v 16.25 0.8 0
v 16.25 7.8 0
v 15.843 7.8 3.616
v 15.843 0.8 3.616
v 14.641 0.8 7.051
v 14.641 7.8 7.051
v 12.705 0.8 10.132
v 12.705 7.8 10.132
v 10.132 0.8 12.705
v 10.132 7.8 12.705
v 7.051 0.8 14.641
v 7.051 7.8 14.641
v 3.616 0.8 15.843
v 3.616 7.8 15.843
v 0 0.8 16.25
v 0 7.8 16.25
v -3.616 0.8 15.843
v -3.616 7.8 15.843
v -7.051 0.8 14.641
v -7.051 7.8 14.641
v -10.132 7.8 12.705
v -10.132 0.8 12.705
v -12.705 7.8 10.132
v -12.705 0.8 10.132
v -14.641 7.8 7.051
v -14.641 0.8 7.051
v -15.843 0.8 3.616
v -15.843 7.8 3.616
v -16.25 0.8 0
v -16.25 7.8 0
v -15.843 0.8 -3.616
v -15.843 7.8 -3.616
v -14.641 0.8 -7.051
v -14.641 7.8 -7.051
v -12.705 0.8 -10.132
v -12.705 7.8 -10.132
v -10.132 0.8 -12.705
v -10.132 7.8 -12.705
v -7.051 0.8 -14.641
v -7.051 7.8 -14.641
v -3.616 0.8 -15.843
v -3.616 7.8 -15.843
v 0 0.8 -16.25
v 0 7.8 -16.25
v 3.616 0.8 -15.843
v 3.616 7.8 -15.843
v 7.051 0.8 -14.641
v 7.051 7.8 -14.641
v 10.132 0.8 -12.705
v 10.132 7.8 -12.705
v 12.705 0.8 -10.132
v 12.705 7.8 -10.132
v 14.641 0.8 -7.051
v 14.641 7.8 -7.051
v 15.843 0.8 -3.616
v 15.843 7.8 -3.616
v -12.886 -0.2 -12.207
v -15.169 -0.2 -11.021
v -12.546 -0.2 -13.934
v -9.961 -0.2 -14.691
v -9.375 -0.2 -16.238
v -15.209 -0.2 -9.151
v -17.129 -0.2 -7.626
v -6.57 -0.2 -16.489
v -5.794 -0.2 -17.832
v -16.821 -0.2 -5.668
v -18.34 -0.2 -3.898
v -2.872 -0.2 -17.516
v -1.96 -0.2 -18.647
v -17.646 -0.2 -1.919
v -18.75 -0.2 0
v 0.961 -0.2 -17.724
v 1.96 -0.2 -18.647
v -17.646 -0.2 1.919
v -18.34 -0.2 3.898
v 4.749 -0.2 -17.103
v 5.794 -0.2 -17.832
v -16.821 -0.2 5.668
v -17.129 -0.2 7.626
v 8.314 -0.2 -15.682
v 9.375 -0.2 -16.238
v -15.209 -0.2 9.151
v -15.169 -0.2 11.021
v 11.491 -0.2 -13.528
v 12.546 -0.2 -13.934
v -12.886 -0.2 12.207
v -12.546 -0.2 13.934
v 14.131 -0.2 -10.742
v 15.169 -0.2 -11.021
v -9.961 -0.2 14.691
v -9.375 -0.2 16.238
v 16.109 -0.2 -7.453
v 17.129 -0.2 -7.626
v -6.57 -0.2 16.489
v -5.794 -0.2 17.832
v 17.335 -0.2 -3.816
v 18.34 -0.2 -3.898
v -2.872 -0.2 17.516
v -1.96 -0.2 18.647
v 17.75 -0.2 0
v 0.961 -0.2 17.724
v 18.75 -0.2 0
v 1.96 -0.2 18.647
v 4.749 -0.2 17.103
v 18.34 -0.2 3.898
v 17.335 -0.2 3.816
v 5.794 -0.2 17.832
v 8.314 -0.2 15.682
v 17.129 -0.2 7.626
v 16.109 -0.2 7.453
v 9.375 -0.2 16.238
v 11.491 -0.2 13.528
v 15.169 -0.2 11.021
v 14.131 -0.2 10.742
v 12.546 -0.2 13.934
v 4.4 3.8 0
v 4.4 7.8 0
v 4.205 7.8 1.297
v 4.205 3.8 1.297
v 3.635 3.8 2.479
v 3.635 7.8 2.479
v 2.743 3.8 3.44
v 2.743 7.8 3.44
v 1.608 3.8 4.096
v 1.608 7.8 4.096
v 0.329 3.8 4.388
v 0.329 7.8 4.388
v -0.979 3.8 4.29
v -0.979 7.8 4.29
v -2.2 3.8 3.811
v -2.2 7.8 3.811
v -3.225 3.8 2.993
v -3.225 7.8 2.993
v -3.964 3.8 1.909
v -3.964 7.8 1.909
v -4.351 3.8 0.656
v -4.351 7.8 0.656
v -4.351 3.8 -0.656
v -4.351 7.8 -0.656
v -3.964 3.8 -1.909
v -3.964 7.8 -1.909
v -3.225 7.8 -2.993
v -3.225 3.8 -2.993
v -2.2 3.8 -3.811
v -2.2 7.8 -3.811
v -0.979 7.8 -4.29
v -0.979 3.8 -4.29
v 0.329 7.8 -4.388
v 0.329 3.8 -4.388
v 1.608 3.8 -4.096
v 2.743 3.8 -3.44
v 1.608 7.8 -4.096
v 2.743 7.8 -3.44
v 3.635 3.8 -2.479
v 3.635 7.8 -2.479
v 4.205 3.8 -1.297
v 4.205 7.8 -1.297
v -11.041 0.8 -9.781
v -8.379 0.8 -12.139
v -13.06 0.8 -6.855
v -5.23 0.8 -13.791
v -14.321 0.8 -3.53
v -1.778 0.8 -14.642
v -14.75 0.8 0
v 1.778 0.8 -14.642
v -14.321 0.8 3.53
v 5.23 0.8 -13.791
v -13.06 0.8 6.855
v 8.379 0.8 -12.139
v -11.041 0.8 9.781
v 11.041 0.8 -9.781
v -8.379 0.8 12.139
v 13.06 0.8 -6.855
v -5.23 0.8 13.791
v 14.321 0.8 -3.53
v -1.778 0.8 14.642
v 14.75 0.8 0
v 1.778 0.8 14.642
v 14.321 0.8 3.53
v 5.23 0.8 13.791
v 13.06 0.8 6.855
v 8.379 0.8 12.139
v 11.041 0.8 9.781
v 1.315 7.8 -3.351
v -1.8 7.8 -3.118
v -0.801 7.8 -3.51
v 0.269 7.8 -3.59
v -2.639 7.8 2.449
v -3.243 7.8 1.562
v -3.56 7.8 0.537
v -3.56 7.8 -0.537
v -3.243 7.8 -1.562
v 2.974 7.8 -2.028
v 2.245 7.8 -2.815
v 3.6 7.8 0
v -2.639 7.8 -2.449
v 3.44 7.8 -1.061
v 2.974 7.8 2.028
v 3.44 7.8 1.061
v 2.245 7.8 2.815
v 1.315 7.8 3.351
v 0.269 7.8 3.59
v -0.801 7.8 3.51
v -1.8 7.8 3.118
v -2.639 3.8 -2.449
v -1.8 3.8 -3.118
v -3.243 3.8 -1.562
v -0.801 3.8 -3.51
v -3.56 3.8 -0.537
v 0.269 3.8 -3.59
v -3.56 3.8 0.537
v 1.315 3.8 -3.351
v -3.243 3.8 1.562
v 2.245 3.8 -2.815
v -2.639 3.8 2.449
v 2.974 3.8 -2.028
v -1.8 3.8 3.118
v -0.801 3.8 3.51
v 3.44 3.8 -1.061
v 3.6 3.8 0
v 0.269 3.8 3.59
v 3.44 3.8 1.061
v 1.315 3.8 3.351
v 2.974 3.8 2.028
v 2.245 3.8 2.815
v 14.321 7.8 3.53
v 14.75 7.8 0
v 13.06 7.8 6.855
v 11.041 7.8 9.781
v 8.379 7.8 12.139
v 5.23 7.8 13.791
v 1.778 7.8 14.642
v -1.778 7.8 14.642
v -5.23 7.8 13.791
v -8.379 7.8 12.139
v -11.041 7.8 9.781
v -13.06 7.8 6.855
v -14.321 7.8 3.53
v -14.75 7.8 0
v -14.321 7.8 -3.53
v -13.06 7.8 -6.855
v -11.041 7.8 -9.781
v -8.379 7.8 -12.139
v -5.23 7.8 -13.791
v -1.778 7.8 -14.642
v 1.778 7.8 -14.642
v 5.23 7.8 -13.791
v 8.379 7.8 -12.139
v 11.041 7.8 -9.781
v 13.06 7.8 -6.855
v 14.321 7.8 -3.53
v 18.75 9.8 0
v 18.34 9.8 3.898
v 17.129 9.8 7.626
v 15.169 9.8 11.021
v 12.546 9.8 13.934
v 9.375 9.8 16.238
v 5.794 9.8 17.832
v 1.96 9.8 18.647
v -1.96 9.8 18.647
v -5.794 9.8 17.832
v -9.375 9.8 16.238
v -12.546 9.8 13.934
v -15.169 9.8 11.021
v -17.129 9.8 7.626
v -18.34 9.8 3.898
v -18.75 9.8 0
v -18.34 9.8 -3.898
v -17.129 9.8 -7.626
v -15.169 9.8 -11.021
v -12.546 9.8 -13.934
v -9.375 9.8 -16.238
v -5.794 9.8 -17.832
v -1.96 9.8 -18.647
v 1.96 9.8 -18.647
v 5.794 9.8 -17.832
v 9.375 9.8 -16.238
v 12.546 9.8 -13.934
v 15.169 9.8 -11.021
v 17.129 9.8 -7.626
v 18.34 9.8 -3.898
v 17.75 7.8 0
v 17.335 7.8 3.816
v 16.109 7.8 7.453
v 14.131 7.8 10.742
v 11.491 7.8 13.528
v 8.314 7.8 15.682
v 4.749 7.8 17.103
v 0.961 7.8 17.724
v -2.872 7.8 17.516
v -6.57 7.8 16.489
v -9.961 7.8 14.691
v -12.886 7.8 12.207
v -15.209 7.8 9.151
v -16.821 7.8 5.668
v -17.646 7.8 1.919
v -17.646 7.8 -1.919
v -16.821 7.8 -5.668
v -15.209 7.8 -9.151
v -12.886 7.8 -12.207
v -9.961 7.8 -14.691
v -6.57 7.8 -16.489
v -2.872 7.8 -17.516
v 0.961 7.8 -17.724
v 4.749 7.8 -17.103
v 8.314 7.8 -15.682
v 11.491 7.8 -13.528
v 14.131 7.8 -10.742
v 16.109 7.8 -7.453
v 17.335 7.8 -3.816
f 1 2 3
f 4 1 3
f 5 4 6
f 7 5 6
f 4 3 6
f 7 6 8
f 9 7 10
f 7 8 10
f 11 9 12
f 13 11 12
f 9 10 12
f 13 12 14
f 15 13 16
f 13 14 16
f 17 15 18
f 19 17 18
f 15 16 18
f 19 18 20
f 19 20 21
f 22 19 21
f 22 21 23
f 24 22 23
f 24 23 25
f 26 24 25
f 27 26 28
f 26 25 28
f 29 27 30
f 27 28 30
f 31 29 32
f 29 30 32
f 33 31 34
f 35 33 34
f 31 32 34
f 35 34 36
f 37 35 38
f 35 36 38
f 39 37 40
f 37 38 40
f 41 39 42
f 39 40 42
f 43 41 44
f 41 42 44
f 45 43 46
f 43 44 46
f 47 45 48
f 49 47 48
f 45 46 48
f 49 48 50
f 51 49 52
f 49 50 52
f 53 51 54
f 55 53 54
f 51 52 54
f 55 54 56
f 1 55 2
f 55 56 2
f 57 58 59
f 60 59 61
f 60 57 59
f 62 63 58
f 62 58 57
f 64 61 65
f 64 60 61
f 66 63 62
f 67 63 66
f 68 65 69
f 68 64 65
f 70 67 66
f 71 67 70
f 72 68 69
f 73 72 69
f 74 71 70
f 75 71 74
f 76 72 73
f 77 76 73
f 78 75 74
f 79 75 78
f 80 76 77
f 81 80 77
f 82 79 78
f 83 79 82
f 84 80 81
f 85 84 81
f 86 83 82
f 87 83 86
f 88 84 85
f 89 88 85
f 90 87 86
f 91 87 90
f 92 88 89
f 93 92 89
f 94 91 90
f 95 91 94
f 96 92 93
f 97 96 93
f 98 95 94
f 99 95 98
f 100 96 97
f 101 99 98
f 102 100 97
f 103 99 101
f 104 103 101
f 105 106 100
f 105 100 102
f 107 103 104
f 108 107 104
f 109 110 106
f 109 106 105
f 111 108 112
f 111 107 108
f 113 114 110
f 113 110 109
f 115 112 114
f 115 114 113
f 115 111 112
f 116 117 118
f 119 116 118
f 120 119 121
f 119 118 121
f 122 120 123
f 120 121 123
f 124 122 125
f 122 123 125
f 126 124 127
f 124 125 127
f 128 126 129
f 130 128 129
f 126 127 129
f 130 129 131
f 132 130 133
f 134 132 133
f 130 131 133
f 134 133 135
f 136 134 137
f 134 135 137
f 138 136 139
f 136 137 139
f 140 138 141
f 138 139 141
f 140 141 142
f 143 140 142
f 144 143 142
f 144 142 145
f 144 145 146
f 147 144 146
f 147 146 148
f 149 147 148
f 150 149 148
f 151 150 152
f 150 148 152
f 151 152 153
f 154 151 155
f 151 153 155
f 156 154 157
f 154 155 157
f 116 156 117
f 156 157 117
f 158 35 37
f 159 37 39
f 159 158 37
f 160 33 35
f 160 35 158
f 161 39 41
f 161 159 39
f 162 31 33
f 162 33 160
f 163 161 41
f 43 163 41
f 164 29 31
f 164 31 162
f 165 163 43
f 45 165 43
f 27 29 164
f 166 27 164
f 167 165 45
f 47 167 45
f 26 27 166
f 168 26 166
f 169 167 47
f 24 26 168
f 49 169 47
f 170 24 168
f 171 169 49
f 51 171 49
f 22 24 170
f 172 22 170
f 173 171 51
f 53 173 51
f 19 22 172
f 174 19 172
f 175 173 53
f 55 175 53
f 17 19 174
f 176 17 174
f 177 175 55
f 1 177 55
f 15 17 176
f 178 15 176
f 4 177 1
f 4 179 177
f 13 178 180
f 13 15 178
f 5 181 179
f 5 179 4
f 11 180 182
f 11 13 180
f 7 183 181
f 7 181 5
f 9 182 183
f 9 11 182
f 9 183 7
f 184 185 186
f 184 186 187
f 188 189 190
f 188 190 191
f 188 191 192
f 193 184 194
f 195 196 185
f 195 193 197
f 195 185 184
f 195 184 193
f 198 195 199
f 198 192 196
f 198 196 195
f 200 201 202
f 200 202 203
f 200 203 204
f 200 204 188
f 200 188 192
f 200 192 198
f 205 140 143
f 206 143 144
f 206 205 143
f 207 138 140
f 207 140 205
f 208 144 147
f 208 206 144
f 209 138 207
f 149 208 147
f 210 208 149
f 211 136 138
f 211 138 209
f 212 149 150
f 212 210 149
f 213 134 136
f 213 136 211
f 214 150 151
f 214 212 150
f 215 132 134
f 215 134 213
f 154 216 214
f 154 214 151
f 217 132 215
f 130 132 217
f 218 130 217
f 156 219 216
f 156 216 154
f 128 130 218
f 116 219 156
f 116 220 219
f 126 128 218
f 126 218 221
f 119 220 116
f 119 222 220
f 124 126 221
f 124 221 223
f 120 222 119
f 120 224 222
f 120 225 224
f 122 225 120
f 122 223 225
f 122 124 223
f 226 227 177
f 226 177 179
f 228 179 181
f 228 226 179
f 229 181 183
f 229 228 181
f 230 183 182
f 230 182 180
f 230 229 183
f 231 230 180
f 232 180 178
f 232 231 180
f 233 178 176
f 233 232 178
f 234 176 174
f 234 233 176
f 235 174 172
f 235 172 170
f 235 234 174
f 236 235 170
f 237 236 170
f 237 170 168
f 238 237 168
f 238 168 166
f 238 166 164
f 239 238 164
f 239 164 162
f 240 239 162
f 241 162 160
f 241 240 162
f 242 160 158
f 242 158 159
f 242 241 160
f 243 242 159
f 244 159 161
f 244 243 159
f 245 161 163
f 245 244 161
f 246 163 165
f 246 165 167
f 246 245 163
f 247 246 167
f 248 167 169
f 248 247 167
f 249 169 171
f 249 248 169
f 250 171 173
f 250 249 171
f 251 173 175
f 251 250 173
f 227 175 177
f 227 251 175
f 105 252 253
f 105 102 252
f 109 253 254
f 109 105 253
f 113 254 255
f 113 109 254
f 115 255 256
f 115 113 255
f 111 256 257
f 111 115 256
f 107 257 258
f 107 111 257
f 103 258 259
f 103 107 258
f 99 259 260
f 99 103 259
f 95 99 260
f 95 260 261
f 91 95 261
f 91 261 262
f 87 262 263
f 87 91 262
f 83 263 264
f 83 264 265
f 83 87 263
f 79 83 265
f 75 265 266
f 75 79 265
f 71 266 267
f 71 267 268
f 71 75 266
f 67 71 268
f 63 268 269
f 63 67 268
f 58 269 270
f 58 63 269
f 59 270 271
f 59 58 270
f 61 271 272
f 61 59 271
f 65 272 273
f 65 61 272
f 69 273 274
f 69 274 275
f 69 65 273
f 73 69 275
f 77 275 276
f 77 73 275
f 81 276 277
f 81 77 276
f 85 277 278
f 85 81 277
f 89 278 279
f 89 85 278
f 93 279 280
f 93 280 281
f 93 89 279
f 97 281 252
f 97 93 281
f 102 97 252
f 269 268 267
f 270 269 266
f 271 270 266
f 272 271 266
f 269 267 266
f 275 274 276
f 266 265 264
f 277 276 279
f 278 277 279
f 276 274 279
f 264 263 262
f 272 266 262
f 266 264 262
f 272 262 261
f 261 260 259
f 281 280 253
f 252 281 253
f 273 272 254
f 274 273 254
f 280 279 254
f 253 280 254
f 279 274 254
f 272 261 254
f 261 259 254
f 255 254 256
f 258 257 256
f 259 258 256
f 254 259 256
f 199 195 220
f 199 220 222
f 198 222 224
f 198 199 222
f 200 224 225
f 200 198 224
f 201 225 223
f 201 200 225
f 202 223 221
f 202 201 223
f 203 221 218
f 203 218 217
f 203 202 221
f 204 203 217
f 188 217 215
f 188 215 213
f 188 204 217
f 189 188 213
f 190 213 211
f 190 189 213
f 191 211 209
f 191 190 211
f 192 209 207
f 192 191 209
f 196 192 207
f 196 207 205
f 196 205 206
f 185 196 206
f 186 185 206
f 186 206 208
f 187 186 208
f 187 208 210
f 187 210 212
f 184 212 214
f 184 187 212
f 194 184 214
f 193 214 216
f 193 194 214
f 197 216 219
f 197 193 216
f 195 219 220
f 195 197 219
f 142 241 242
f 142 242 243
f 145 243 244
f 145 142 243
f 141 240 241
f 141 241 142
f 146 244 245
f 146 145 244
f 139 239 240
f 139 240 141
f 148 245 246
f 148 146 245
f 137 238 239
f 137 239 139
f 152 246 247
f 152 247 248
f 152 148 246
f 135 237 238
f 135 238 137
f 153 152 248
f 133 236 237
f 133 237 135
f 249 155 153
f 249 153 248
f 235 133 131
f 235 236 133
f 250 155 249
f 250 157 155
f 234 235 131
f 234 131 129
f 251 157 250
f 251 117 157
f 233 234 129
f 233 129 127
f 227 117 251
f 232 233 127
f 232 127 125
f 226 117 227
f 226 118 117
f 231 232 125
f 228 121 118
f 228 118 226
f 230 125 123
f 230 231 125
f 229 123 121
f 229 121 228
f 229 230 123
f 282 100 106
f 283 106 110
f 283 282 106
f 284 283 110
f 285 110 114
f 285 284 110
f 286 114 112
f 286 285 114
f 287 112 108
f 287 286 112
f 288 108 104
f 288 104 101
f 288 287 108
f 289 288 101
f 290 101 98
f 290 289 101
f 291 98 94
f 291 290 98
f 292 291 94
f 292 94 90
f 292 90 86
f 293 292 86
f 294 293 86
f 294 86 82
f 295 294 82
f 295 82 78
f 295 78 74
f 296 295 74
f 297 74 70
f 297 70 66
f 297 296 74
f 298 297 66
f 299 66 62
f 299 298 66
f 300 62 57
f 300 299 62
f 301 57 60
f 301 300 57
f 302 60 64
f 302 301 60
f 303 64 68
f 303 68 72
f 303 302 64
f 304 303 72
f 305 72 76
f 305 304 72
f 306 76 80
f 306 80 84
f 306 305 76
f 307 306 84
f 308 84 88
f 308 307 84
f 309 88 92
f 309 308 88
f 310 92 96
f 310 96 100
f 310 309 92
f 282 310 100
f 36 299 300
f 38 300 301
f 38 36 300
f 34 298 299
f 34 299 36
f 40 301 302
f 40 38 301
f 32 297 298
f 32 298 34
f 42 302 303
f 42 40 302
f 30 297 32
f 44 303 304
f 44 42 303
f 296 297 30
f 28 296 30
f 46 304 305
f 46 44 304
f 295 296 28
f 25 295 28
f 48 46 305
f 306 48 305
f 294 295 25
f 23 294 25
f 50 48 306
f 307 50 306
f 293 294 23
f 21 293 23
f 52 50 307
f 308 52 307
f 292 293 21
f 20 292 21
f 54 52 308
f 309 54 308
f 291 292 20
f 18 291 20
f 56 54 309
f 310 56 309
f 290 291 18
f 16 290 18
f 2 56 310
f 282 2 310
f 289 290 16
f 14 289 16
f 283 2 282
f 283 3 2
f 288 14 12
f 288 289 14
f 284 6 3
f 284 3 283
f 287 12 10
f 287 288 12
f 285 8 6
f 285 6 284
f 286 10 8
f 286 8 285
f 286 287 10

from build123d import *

# Parameters (mm, degrees)
SKETCH002_R      = 18.75
PAD001_DEPTH     = 2
SKETCH003_R      = 4.4
SKETCH003_R_2    = 3.6
PAD002_DEPTH     = 4
SKETCH003001_R   = 16.25
SKETCH003001_R_2 = 14.75
PAD003_DEPTH     = 7
SKETCH003002_R   = 18.75
SKETCH003002_R_2 = 17.75
PAD004_DEPTH     = 8


with BuildPart() as toppad:
    # Sketch002 → Pad001 (new body)
    with BuildSketch(Plane.XZ.offset(-7.8)):
        Circle(SKETCH002_R)
    extrude(amount=-PAD001_DEPTH)


with BuildPart() as centershaft:
    # Sketch003 → Pad002 (new body)
    with BuildSketch(Plane.XZ.offset(-7.8)):
        Circle(SKETCH003_R)
        Circle(SKETCH003_R_2, mode=Mode.SUBTRACT)
    extrude(amount=PAD002_DEPTH)


with BuildPart() as topguidering001:
    # Sketch003001 → Pad003 (new body)
    with BuildSketch(Plane.XZ.offset(-7.8)):
        Circle(SKETCH003001_R)
        Circle(SKETCH003001_R_2, mode=Mode.SUBTRACT)
    extrude(amount=PAD003_DEPTH)


with BuildPart() as topfusion:
    # Sketch003002 → Pad004 (new body)
    with BuildSketch(Plane.XZ.offset(-7.8)):
        Circle(SKETCH003002_R)
        Circle(SKETCH003002_R_2, mode=Mode.SUBTRACT)
    extrude(amount=PAD004_DEPTH)

    # Fusion001: union TopPad, CenterShaft, TopGuideRing001
    add(toppad.part)
    add(centershaft.part)
    add(topguidering001.part)


solid = topfusion.part
